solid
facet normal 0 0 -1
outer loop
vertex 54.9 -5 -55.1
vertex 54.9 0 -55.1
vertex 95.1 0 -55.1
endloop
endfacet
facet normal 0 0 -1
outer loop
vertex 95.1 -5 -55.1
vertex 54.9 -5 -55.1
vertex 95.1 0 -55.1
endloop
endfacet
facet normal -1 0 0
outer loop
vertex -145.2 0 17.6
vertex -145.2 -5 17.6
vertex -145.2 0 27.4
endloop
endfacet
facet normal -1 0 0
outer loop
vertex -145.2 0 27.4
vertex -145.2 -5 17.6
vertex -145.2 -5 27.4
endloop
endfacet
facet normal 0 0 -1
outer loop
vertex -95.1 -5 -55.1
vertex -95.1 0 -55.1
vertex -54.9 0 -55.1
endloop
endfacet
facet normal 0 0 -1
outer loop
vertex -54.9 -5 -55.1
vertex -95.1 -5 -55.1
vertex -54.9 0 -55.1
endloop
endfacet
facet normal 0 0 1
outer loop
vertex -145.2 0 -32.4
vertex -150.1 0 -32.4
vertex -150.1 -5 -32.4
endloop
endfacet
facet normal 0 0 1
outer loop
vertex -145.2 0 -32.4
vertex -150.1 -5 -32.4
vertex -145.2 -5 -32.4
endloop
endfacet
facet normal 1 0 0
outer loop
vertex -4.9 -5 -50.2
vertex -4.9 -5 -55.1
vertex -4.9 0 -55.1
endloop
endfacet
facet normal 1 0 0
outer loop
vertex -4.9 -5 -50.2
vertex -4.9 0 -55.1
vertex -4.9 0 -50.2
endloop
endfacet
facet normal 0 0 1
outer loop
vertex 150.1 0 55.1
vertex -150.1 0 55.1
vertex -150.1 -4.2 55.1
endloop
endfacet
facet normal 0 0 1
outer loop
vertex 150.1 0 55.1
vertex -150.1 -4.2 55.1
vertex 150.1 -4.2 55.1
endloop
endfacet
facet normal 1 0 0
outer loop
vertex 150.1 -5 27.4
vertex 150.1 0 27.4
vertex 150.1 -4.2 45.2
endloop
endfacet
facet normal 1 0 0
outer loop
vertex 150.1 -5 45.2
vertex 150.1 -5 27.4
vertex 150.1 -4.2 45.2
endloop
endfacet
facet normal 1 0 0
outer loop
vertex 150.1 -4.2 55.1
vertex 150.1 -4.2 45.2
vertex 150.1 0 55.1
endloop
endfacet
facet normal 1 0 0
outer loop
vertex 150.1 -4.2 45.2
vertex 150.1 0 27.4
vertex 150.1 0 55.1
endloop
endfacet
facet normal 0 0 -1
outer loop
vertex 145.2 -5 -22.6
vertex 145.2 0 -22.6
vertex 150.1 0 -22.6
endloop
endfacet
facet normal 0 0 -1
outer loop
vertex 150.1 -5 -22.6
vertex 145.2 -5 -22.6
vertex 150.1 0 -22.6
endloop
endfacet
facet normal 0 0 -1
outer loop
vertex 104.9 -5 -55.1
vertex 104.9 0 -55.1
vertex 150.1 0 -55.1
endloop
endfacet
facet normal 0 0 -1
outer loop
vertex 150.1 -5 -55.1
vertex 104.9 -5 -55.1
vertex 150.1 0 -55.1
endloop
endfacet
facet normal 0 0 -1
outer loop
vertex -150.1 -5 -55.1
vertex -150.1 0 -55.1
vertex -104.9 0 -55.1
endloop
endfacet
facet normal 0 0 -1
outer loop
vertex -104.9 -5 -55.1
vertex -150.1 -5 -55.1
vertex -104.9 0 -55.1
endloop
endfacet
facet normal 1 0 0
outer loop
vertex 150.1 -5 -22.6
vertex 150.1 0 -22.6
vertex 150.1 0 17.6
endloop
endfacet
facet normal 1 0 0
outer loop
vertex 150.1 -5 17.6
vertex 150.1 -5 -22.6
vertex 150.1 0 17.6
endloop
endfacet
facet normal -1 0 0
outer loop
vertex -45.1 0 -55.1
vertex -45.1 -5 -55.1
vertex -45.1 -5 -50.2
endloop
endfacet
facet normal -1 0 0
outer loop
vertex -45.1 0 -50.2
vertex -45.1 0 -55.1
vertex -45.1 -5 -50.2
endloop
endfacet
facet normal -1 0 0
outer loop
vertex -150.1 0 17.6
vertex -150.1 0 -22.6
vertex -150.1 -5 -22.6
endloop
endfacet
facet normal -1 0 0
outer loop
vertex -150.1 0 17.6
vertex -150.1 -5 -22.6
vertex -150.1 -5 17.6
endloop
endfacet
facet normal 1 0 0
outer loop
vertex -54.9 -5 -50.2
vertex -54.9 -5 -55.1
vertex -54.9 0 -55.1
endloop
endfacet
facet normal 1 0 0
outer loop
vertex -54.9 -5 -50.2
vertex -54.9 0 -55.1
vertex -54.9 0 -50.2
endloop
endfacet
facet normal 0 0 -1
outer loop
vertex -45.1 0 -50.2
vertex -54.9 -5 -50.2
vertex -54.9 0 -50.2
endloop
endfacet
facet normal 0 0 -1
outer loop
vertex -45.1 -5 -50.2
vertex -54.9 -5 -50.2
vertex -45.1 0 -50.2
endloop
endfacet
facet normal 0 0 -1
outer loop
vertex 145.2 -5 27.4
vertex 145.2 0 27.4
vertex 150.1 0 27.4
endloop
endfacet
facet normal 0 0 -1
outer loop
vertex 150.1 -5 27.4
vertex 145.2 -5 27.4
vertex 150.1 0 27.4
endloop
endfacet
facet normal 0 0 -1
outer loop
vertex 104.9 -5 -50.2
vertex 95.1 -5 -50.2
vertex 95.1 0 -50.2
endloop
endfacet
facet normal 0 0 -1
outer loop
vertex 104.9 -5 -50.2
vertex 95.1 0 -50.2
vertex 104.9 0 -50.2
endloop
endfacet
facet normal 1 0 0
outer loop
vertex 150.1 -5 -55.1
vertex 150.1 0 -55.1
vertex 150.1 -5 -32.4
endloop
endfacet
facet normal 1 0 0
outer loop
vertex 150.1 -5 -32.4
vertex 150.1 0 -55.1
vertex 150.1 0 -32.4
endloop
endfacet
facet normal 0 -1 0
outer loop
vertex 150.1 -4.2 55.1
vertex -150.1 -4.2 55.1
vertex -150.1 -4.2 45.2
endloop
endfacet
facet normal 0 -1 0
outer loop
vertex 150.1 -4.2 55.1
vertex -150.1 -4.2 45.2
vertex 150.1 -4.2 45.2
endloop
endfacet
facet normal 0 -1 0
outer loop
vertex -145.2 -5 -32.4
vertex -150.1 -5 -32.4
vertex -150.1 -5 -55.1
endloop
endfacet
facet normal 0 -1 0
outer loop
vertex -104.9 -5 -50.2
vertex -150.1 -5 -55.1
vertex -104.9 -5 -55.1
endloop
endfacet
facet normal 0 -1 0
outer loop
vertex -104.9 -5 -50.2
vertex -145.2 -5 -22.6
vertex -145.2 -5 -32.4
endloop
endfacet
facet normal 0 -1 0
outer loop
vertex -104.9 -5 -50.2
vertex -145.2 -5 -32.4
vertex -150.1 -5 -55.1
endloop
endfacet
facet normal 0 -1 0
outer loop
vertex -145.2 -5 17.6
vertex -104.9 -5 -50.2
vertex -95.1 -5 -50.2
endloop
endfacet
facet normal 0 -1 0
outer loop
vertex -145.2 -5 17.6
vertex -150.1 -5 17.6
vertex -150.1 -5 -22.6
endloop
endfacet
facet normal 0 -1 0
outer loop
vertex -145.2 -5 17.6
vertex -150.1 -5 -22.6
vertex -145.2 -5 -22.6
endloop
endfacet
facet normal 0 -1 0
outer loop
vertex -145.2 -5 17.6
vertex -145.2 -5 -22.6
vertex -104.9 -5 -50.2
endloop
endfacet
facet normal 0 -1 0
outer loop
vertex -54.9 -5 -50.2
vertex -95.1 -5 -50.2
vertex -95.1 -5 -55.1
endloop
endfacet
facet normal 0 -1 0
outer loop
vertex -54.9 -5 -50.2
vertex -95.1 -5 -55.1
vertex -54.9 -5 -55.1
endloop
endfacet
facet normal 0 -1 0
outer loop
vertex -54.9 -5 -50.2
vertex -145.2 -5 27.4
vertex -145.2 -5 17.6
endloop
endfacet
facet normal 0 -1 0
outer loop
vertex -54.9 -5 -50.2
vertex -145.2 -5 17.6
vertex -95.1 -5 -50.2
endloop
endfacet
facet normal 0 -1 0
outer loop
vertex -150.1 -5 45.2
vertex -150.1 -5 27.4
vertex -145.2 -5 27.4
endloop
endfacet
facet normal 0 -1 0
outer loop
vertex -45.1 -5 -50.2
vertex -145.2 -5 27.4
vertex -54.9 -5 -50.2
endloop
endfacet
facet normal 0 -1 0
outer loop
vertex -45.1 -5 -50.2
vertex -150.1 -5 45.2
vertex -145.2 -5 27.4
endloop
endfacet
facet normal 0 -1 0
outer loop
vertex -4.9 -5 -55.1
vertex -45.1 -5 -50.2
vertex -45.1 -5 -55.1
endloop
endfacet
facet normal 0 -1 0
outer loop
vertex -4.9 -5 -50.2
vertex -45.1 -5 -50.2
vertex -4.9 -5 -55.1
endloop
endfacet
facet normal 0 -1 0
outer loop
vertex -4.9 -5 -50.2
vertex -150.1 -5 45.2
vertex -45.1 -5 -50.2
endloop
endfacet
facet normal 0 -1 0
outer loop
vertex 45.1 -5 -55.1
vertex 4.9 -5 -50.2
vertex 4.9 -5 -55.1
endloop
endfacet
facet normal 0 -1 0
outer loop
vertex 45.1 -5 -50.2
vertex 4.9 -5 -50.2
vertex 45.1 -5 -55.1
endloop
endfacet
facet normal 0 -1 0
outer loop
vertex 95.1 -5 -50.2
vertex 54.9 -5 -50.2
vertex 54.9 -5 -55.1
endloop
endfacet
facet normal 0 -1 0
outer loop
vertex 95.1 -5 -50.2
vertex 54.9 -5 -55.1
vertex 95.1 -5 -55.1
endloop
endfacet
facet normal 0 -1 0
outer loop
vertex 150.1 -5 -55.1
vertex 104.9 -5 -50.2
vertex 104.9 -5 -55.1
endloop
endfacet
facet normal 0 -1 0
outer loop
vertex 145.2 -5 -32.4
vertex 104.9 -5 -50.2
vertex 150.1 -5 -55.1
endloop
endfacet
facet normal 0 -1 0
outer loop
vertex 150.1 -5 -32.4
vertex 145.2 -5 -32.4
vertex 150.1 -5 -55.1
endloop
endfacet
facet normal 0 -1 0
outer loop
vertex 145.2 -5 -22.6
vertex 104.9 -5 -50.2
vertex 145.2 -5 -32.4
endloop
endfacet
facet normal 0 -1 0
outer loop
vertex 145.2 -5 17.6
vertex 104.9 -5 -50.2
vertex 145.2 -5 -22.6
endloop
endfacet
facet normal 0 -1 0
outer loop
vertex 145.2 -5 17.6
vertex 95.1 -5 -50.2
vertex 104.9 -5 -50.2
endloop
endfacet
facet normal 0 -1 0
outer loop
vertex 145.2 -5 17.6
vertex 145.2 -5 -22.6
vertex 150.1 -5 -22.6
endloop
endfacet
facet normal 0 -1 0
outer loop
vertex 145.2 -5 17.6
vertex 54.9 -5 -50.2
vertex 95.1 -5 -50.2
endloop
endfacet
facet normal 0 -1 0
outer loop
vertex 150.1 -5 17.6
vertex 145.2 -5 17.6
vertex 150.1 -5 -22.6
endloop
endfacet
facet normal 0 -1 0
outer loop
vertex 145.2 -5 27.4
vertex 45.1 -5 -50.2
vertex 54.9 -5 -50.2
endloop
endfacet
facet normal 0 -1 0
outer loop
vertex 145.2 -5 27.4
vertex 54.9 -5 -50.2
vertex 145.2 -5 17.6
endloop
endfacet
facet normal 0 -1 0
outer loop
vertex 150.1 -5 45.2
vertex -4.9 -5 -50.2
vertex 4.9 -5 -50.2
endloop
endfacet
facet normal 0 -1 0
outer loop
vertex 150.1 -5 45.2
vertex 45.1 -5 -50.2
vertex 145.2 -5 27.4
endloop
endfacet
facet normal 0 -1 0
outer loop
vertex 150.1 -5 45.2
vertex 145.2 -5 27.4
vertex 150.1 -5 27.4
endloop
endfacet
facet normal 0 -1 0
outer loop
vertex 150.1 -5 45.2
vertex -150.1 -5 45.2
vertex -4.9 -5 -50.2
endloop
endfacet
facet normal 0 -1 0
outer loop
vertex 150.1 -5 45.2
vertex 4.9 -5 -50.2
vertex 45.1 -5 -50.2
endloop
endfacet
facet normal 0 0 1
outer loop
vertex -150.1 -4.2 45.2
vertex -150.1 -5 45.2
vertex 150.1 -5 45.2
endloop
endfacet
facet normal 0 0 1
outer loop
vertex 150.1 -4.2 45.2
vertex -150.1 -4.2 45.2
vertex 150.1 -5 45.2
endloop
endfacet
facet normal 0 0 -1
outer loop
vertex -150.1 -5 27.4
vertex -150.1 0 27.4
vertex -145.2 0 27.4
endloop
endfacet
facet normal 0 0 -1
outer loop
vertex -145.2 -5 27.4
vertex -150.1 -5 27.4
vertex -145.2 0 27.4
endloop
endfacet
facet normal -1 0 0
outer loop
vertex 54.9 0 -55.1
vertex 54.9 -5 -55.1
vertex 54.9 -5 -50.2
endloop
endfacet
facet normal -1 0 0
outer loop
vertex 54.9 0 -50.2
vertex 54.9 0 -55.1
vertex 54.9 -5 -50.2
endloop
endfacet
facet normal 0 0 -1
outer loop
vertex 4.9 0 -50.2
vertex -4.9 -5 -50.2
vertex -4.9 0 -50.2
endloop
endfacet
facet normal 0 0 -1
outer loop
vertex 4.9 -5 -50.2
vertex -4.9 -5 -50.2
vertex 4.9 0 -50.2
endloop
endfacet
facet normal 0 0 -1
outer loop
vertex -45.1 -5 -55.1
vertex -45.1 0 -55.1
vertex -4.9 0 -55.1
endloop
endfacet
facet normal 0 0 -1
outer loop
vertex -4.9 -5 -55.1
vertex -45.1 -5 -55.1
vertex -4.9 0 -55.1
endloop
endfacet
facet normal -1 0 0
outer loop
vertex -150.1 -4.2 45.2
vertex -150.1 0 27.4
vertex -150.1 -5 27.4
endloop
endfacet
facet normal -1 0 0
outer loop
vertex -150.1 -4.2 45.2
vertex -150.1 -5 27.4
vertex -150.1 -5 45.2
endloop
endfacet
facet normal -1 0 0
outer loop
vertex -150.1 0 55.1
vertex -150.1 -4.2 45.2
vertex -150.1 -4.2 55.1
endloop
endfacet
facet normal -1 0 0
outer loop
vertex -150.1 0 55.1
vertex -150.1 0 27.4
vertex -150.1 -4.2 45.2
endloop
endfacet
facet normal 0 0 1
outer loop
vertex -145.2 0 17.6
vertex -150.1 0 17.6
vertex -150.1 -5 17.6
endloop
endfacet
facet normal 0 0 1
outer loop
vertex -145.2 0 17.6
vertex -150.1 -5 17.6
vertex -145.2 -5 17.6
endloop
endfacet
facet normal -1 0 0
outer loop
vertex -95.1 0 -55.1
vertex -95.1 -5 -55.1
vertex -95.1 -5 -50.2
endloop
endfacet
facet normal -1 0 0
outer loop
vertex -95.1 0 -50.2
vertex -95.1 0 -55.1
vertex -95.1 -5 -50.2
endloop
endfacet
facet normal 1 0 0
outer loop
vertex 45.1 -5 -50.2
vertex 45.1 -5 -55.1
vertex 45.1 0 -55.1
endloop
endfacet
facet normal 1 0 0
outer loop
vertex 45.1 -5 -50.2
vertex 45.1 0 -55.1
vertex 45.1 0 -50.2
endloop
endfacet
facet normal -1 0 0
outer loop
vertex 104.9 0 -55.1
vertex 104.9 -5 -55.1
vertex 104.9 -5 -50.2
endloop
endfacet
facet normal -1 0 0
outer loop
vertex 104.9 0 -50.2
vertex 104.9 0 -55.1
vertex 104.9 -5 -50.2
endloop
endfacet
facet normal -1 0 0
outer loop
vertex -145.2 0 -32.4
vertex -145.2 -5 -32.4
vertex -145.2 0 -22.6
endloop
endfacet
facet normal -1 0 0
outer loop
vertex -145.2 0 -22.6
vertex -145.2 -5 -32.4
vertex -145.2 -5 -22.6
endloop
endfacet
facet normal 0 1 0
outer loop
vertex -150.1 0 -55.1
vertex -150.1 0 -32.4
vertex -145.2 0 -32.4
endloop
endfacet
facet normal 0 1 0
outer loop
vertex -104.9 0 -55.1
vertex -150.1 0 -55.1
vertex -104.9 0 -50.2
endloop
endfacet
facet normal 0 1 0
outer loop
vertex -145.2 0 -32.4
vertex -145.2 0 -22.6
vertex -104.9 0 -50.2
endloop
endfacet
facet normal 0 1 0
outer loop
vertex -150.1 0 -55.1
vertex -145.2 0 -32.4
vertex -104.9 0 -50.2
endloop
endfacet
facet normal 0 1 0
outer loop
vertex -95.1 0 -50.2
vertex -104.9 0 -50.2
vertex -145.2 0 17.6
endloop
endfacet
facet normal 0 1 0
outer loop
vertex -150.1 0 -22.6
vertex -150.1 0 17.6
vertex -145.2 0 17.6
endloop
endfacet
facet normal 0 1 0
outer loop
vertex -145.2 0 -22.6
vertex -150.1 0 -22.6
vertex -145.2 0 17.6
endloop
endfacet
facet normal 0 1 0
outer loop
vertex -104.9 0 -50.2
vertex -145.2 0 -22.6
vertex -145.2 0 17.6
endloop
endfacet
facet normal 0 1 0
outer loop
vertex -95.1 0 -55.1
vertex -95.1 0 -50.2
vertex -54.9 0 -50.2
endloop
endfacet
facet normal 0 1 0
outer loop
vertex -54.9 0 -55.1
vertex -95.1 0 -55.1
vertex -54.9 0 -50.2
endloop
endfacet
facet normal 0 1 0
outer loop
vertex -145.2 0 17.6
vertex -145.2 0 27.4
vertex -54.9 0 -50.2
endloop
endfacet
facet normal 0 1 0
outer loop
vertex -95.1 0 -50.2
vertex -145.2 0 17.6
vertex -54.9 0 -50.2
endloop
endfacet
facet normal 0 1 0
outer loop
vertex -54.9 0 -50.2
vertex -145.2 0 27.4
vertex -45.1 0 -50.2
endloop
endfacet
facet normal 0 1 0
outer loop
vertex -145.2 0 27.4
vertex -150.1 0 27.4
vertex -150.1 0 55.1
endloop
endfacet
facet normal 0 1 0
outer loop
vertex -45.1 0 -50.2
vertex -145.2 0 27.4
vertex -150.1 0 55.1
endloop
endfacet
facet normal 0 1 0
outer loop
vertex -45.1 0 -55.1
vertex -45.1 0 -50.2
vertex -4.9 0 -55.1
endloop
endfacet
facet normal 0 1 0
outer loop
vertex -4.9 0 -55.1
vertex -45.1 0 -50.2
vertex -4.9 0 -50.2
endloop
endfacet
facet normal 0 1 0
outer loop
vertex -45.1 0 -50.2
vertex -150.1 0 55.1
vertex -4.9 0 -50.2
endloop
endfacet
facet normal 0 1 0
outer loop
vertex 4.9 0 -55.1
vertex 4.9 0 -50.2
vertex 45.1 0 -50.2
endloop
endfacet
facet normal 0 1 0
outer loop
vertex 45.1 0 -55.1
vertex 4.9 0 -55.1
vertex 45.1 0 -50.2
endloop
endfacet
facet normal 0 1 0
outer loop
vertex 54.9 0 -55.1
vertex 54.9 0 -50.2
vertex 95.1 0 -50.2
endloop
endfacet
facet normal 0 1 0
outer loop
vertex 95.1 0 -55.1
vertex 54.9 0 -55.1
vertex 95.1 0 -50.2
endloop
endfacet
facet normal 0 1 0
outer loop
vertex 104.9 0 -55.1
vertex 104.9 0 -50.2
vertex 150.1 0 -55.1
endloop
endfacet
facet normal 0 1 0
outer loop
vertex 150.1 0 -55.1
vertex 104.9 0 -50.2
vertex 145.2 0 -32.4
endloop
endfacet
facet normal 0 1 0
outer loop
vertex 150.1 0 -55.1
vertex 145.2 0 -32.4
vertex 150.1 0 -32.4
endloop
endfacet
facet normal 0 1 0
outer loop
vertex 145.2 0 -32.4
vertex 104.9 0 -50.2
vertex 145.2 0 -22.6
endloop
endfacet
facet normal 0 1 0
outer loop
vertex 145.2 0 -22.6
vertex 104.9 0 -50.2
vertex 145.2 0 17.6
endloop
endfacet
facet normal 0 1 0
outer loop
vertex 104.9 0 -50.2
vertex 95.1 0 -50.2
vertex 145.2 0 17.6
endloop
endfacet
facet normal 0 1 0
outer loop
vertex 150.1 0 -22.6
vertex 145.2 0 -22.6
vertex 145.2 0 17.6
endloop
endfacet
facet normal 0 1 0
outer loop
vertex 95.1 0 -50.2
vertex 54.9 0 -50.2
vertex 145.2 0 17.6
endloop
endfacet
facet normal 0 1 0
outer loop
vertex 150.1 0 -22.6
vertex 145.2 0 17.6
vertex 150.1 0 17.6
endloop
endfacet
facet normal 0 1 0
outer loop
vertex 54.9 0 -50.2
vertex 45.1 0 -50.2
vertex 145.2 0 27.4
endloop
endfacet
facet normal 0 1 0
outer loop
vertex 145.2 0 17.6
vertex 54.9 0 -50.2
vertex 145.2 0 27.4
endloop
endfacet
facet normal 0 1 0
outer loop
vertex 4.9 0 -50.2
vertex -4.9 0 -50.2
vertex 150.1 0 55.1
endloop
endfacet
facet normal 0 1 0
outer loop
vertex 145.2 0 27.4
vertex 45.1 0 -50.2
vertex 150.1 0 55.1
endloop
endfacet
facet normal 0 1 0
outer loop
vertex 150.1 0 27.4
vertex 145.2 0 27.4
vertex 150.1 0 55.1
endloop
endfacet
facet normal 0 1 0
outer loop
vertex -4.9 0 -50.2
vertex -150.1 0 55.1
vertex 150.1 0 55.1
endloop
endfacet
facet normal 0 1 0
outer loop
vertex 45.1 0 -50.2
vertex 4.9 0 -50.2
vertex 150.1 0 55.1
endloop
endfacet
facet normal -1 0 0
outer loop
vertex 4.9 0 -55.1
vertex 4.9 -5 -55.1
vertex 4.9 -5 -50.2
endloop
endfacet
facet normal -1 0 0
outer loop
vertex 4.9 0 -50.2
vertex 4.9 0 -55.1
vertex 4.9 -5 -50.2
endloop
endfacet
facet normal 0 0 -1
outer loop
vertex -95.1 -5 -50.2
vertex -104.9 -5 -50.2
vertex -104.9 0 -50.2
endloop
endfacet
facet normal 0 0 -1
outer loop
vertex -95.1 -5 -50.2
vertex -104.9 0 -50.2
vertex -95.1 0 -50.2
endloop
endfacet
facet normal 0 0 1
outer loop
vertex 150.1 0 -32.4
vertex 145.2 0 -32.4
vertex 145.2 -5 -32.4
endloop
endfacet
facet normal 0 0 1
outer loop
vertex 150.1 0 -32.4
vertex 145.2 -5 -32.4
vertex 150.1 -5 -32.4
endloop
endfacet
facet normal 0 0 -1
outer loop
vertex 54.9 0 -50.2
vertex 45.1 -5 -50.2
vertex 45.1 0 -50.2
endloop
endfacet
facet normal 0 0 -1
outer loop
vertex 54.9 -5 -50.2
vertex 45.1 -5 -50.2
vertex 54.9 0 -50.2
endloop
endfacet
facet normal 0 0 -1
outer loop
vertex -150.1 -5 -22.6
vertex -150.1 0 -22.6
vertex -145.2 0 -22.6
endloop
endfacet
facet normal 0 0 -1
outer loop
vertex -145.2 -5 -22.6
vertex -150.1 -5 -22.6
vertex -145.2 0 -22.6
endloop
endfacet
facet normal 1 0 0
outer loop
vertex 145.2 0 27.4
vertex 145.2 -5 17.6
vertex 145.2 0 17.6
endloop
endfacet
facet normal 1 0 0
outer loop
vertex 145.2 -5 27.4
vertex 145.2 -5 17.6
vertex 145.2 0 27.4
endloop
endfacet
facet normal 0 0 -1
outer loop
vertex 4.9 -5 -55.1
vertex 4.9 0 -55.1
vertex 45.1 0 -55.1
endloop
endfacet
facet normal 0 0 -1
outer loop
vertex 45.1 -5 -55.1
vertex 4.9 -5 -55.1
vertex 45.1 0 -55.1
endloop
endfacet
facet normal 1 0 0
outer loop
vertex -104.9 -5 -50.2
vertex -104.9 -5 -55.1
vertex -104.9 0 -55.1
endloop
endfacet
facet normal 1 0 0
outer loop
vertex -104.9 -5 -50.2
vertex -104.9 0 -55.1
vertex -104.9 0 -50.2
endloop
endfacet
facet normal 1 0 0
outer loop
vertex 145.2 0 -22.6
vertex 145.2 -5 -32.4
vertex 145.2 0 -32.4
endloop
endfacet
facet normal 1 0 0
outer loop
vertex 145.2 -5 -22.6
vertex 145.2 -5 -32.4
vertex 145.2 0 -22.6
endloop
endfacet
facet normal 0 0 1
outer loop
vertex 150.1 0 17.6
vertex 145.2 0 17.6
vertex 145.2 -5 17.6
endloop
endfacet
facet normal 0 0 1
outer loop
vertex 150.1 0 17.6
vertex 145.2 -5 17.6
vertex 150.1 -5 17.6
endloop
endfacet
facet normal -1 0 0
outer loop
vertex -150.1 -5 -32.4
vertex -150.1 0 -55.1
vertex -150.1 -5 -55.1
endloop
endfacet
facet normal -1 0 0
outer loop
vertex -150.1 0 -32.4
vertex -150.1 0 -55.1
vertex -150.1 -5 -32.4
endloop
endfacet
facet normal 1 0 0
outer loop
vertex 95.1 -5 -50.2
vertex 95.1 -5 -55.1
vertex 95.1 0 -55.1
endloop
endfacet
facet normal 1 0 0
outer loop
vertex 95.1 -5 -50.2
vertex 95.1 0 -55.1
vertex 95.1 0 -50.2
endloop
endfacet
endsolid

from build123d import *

# Parameters (mm, degrees)
F0_W     = 300.2
F0_H     = 110.2
F1_DEPTH = 5
F2_W     = 300.2
F2_H     = 9.9
F3_DEPTH = 0.8
F4_W     = 4.9
F4_H     = 9.8
F4_W_2   = 9.8
F4_H_2   = 4.9
F5_DEPTH = 5


with BuildPart() as f1:
    # F0 (on Front) → F1 (new body)
    with BuildSketch(Plane.XZ):
        Rectangle(F0_W, F0_H)
    extrude(amount=F1_DEPTH)

    # F2 (on face) → F3 (cut)
    with BuildSketch(Plane.XZ.offset(5)):
        with Locations((0, 50.15)):
            Rectangle(F2_W, F2_H)
    extrude(amount=-F3_DEPTH, mode=Mode.SUBTRACT)

    # F4 (on face) → F5 (cut, through all)
    with BuildSketch(Plane.XZ.offset(5)):
        with Locations((-147.65, 22.5)):
            Rectangle(F4_W, F4_H)
        with Locations((-147.65, -27.5)):
            Rectangle(F4_W, F4_H)
        with Locations((-100, -52.65)):
            Rectangle(F4_W_2, F4_H_2)
        with Locations((-50, -52.65)):
            Rectangle(F4_W_2, F4_H_2)
        with Locations((0, -52.65)):
            Rectangle(F4_W_2, F4_H_2)
        with Locations((50, -52.65)):
            Rectangle(F4_W_2, F4_H_2)
        with Locations((147.65, 22.5)):
            Rectangle(F4_W, F4_H)
        with Locations((147.65, -27.5)):
            Rectangle(F4_W, F4_H)
        with Locations((100, -52.65)):
            Rectangle(F4_W_2, F4_H_2)
    extrude(amount=-F5_DEPTH, mode=Mode.SUBTRACT)


solid = f1.part
